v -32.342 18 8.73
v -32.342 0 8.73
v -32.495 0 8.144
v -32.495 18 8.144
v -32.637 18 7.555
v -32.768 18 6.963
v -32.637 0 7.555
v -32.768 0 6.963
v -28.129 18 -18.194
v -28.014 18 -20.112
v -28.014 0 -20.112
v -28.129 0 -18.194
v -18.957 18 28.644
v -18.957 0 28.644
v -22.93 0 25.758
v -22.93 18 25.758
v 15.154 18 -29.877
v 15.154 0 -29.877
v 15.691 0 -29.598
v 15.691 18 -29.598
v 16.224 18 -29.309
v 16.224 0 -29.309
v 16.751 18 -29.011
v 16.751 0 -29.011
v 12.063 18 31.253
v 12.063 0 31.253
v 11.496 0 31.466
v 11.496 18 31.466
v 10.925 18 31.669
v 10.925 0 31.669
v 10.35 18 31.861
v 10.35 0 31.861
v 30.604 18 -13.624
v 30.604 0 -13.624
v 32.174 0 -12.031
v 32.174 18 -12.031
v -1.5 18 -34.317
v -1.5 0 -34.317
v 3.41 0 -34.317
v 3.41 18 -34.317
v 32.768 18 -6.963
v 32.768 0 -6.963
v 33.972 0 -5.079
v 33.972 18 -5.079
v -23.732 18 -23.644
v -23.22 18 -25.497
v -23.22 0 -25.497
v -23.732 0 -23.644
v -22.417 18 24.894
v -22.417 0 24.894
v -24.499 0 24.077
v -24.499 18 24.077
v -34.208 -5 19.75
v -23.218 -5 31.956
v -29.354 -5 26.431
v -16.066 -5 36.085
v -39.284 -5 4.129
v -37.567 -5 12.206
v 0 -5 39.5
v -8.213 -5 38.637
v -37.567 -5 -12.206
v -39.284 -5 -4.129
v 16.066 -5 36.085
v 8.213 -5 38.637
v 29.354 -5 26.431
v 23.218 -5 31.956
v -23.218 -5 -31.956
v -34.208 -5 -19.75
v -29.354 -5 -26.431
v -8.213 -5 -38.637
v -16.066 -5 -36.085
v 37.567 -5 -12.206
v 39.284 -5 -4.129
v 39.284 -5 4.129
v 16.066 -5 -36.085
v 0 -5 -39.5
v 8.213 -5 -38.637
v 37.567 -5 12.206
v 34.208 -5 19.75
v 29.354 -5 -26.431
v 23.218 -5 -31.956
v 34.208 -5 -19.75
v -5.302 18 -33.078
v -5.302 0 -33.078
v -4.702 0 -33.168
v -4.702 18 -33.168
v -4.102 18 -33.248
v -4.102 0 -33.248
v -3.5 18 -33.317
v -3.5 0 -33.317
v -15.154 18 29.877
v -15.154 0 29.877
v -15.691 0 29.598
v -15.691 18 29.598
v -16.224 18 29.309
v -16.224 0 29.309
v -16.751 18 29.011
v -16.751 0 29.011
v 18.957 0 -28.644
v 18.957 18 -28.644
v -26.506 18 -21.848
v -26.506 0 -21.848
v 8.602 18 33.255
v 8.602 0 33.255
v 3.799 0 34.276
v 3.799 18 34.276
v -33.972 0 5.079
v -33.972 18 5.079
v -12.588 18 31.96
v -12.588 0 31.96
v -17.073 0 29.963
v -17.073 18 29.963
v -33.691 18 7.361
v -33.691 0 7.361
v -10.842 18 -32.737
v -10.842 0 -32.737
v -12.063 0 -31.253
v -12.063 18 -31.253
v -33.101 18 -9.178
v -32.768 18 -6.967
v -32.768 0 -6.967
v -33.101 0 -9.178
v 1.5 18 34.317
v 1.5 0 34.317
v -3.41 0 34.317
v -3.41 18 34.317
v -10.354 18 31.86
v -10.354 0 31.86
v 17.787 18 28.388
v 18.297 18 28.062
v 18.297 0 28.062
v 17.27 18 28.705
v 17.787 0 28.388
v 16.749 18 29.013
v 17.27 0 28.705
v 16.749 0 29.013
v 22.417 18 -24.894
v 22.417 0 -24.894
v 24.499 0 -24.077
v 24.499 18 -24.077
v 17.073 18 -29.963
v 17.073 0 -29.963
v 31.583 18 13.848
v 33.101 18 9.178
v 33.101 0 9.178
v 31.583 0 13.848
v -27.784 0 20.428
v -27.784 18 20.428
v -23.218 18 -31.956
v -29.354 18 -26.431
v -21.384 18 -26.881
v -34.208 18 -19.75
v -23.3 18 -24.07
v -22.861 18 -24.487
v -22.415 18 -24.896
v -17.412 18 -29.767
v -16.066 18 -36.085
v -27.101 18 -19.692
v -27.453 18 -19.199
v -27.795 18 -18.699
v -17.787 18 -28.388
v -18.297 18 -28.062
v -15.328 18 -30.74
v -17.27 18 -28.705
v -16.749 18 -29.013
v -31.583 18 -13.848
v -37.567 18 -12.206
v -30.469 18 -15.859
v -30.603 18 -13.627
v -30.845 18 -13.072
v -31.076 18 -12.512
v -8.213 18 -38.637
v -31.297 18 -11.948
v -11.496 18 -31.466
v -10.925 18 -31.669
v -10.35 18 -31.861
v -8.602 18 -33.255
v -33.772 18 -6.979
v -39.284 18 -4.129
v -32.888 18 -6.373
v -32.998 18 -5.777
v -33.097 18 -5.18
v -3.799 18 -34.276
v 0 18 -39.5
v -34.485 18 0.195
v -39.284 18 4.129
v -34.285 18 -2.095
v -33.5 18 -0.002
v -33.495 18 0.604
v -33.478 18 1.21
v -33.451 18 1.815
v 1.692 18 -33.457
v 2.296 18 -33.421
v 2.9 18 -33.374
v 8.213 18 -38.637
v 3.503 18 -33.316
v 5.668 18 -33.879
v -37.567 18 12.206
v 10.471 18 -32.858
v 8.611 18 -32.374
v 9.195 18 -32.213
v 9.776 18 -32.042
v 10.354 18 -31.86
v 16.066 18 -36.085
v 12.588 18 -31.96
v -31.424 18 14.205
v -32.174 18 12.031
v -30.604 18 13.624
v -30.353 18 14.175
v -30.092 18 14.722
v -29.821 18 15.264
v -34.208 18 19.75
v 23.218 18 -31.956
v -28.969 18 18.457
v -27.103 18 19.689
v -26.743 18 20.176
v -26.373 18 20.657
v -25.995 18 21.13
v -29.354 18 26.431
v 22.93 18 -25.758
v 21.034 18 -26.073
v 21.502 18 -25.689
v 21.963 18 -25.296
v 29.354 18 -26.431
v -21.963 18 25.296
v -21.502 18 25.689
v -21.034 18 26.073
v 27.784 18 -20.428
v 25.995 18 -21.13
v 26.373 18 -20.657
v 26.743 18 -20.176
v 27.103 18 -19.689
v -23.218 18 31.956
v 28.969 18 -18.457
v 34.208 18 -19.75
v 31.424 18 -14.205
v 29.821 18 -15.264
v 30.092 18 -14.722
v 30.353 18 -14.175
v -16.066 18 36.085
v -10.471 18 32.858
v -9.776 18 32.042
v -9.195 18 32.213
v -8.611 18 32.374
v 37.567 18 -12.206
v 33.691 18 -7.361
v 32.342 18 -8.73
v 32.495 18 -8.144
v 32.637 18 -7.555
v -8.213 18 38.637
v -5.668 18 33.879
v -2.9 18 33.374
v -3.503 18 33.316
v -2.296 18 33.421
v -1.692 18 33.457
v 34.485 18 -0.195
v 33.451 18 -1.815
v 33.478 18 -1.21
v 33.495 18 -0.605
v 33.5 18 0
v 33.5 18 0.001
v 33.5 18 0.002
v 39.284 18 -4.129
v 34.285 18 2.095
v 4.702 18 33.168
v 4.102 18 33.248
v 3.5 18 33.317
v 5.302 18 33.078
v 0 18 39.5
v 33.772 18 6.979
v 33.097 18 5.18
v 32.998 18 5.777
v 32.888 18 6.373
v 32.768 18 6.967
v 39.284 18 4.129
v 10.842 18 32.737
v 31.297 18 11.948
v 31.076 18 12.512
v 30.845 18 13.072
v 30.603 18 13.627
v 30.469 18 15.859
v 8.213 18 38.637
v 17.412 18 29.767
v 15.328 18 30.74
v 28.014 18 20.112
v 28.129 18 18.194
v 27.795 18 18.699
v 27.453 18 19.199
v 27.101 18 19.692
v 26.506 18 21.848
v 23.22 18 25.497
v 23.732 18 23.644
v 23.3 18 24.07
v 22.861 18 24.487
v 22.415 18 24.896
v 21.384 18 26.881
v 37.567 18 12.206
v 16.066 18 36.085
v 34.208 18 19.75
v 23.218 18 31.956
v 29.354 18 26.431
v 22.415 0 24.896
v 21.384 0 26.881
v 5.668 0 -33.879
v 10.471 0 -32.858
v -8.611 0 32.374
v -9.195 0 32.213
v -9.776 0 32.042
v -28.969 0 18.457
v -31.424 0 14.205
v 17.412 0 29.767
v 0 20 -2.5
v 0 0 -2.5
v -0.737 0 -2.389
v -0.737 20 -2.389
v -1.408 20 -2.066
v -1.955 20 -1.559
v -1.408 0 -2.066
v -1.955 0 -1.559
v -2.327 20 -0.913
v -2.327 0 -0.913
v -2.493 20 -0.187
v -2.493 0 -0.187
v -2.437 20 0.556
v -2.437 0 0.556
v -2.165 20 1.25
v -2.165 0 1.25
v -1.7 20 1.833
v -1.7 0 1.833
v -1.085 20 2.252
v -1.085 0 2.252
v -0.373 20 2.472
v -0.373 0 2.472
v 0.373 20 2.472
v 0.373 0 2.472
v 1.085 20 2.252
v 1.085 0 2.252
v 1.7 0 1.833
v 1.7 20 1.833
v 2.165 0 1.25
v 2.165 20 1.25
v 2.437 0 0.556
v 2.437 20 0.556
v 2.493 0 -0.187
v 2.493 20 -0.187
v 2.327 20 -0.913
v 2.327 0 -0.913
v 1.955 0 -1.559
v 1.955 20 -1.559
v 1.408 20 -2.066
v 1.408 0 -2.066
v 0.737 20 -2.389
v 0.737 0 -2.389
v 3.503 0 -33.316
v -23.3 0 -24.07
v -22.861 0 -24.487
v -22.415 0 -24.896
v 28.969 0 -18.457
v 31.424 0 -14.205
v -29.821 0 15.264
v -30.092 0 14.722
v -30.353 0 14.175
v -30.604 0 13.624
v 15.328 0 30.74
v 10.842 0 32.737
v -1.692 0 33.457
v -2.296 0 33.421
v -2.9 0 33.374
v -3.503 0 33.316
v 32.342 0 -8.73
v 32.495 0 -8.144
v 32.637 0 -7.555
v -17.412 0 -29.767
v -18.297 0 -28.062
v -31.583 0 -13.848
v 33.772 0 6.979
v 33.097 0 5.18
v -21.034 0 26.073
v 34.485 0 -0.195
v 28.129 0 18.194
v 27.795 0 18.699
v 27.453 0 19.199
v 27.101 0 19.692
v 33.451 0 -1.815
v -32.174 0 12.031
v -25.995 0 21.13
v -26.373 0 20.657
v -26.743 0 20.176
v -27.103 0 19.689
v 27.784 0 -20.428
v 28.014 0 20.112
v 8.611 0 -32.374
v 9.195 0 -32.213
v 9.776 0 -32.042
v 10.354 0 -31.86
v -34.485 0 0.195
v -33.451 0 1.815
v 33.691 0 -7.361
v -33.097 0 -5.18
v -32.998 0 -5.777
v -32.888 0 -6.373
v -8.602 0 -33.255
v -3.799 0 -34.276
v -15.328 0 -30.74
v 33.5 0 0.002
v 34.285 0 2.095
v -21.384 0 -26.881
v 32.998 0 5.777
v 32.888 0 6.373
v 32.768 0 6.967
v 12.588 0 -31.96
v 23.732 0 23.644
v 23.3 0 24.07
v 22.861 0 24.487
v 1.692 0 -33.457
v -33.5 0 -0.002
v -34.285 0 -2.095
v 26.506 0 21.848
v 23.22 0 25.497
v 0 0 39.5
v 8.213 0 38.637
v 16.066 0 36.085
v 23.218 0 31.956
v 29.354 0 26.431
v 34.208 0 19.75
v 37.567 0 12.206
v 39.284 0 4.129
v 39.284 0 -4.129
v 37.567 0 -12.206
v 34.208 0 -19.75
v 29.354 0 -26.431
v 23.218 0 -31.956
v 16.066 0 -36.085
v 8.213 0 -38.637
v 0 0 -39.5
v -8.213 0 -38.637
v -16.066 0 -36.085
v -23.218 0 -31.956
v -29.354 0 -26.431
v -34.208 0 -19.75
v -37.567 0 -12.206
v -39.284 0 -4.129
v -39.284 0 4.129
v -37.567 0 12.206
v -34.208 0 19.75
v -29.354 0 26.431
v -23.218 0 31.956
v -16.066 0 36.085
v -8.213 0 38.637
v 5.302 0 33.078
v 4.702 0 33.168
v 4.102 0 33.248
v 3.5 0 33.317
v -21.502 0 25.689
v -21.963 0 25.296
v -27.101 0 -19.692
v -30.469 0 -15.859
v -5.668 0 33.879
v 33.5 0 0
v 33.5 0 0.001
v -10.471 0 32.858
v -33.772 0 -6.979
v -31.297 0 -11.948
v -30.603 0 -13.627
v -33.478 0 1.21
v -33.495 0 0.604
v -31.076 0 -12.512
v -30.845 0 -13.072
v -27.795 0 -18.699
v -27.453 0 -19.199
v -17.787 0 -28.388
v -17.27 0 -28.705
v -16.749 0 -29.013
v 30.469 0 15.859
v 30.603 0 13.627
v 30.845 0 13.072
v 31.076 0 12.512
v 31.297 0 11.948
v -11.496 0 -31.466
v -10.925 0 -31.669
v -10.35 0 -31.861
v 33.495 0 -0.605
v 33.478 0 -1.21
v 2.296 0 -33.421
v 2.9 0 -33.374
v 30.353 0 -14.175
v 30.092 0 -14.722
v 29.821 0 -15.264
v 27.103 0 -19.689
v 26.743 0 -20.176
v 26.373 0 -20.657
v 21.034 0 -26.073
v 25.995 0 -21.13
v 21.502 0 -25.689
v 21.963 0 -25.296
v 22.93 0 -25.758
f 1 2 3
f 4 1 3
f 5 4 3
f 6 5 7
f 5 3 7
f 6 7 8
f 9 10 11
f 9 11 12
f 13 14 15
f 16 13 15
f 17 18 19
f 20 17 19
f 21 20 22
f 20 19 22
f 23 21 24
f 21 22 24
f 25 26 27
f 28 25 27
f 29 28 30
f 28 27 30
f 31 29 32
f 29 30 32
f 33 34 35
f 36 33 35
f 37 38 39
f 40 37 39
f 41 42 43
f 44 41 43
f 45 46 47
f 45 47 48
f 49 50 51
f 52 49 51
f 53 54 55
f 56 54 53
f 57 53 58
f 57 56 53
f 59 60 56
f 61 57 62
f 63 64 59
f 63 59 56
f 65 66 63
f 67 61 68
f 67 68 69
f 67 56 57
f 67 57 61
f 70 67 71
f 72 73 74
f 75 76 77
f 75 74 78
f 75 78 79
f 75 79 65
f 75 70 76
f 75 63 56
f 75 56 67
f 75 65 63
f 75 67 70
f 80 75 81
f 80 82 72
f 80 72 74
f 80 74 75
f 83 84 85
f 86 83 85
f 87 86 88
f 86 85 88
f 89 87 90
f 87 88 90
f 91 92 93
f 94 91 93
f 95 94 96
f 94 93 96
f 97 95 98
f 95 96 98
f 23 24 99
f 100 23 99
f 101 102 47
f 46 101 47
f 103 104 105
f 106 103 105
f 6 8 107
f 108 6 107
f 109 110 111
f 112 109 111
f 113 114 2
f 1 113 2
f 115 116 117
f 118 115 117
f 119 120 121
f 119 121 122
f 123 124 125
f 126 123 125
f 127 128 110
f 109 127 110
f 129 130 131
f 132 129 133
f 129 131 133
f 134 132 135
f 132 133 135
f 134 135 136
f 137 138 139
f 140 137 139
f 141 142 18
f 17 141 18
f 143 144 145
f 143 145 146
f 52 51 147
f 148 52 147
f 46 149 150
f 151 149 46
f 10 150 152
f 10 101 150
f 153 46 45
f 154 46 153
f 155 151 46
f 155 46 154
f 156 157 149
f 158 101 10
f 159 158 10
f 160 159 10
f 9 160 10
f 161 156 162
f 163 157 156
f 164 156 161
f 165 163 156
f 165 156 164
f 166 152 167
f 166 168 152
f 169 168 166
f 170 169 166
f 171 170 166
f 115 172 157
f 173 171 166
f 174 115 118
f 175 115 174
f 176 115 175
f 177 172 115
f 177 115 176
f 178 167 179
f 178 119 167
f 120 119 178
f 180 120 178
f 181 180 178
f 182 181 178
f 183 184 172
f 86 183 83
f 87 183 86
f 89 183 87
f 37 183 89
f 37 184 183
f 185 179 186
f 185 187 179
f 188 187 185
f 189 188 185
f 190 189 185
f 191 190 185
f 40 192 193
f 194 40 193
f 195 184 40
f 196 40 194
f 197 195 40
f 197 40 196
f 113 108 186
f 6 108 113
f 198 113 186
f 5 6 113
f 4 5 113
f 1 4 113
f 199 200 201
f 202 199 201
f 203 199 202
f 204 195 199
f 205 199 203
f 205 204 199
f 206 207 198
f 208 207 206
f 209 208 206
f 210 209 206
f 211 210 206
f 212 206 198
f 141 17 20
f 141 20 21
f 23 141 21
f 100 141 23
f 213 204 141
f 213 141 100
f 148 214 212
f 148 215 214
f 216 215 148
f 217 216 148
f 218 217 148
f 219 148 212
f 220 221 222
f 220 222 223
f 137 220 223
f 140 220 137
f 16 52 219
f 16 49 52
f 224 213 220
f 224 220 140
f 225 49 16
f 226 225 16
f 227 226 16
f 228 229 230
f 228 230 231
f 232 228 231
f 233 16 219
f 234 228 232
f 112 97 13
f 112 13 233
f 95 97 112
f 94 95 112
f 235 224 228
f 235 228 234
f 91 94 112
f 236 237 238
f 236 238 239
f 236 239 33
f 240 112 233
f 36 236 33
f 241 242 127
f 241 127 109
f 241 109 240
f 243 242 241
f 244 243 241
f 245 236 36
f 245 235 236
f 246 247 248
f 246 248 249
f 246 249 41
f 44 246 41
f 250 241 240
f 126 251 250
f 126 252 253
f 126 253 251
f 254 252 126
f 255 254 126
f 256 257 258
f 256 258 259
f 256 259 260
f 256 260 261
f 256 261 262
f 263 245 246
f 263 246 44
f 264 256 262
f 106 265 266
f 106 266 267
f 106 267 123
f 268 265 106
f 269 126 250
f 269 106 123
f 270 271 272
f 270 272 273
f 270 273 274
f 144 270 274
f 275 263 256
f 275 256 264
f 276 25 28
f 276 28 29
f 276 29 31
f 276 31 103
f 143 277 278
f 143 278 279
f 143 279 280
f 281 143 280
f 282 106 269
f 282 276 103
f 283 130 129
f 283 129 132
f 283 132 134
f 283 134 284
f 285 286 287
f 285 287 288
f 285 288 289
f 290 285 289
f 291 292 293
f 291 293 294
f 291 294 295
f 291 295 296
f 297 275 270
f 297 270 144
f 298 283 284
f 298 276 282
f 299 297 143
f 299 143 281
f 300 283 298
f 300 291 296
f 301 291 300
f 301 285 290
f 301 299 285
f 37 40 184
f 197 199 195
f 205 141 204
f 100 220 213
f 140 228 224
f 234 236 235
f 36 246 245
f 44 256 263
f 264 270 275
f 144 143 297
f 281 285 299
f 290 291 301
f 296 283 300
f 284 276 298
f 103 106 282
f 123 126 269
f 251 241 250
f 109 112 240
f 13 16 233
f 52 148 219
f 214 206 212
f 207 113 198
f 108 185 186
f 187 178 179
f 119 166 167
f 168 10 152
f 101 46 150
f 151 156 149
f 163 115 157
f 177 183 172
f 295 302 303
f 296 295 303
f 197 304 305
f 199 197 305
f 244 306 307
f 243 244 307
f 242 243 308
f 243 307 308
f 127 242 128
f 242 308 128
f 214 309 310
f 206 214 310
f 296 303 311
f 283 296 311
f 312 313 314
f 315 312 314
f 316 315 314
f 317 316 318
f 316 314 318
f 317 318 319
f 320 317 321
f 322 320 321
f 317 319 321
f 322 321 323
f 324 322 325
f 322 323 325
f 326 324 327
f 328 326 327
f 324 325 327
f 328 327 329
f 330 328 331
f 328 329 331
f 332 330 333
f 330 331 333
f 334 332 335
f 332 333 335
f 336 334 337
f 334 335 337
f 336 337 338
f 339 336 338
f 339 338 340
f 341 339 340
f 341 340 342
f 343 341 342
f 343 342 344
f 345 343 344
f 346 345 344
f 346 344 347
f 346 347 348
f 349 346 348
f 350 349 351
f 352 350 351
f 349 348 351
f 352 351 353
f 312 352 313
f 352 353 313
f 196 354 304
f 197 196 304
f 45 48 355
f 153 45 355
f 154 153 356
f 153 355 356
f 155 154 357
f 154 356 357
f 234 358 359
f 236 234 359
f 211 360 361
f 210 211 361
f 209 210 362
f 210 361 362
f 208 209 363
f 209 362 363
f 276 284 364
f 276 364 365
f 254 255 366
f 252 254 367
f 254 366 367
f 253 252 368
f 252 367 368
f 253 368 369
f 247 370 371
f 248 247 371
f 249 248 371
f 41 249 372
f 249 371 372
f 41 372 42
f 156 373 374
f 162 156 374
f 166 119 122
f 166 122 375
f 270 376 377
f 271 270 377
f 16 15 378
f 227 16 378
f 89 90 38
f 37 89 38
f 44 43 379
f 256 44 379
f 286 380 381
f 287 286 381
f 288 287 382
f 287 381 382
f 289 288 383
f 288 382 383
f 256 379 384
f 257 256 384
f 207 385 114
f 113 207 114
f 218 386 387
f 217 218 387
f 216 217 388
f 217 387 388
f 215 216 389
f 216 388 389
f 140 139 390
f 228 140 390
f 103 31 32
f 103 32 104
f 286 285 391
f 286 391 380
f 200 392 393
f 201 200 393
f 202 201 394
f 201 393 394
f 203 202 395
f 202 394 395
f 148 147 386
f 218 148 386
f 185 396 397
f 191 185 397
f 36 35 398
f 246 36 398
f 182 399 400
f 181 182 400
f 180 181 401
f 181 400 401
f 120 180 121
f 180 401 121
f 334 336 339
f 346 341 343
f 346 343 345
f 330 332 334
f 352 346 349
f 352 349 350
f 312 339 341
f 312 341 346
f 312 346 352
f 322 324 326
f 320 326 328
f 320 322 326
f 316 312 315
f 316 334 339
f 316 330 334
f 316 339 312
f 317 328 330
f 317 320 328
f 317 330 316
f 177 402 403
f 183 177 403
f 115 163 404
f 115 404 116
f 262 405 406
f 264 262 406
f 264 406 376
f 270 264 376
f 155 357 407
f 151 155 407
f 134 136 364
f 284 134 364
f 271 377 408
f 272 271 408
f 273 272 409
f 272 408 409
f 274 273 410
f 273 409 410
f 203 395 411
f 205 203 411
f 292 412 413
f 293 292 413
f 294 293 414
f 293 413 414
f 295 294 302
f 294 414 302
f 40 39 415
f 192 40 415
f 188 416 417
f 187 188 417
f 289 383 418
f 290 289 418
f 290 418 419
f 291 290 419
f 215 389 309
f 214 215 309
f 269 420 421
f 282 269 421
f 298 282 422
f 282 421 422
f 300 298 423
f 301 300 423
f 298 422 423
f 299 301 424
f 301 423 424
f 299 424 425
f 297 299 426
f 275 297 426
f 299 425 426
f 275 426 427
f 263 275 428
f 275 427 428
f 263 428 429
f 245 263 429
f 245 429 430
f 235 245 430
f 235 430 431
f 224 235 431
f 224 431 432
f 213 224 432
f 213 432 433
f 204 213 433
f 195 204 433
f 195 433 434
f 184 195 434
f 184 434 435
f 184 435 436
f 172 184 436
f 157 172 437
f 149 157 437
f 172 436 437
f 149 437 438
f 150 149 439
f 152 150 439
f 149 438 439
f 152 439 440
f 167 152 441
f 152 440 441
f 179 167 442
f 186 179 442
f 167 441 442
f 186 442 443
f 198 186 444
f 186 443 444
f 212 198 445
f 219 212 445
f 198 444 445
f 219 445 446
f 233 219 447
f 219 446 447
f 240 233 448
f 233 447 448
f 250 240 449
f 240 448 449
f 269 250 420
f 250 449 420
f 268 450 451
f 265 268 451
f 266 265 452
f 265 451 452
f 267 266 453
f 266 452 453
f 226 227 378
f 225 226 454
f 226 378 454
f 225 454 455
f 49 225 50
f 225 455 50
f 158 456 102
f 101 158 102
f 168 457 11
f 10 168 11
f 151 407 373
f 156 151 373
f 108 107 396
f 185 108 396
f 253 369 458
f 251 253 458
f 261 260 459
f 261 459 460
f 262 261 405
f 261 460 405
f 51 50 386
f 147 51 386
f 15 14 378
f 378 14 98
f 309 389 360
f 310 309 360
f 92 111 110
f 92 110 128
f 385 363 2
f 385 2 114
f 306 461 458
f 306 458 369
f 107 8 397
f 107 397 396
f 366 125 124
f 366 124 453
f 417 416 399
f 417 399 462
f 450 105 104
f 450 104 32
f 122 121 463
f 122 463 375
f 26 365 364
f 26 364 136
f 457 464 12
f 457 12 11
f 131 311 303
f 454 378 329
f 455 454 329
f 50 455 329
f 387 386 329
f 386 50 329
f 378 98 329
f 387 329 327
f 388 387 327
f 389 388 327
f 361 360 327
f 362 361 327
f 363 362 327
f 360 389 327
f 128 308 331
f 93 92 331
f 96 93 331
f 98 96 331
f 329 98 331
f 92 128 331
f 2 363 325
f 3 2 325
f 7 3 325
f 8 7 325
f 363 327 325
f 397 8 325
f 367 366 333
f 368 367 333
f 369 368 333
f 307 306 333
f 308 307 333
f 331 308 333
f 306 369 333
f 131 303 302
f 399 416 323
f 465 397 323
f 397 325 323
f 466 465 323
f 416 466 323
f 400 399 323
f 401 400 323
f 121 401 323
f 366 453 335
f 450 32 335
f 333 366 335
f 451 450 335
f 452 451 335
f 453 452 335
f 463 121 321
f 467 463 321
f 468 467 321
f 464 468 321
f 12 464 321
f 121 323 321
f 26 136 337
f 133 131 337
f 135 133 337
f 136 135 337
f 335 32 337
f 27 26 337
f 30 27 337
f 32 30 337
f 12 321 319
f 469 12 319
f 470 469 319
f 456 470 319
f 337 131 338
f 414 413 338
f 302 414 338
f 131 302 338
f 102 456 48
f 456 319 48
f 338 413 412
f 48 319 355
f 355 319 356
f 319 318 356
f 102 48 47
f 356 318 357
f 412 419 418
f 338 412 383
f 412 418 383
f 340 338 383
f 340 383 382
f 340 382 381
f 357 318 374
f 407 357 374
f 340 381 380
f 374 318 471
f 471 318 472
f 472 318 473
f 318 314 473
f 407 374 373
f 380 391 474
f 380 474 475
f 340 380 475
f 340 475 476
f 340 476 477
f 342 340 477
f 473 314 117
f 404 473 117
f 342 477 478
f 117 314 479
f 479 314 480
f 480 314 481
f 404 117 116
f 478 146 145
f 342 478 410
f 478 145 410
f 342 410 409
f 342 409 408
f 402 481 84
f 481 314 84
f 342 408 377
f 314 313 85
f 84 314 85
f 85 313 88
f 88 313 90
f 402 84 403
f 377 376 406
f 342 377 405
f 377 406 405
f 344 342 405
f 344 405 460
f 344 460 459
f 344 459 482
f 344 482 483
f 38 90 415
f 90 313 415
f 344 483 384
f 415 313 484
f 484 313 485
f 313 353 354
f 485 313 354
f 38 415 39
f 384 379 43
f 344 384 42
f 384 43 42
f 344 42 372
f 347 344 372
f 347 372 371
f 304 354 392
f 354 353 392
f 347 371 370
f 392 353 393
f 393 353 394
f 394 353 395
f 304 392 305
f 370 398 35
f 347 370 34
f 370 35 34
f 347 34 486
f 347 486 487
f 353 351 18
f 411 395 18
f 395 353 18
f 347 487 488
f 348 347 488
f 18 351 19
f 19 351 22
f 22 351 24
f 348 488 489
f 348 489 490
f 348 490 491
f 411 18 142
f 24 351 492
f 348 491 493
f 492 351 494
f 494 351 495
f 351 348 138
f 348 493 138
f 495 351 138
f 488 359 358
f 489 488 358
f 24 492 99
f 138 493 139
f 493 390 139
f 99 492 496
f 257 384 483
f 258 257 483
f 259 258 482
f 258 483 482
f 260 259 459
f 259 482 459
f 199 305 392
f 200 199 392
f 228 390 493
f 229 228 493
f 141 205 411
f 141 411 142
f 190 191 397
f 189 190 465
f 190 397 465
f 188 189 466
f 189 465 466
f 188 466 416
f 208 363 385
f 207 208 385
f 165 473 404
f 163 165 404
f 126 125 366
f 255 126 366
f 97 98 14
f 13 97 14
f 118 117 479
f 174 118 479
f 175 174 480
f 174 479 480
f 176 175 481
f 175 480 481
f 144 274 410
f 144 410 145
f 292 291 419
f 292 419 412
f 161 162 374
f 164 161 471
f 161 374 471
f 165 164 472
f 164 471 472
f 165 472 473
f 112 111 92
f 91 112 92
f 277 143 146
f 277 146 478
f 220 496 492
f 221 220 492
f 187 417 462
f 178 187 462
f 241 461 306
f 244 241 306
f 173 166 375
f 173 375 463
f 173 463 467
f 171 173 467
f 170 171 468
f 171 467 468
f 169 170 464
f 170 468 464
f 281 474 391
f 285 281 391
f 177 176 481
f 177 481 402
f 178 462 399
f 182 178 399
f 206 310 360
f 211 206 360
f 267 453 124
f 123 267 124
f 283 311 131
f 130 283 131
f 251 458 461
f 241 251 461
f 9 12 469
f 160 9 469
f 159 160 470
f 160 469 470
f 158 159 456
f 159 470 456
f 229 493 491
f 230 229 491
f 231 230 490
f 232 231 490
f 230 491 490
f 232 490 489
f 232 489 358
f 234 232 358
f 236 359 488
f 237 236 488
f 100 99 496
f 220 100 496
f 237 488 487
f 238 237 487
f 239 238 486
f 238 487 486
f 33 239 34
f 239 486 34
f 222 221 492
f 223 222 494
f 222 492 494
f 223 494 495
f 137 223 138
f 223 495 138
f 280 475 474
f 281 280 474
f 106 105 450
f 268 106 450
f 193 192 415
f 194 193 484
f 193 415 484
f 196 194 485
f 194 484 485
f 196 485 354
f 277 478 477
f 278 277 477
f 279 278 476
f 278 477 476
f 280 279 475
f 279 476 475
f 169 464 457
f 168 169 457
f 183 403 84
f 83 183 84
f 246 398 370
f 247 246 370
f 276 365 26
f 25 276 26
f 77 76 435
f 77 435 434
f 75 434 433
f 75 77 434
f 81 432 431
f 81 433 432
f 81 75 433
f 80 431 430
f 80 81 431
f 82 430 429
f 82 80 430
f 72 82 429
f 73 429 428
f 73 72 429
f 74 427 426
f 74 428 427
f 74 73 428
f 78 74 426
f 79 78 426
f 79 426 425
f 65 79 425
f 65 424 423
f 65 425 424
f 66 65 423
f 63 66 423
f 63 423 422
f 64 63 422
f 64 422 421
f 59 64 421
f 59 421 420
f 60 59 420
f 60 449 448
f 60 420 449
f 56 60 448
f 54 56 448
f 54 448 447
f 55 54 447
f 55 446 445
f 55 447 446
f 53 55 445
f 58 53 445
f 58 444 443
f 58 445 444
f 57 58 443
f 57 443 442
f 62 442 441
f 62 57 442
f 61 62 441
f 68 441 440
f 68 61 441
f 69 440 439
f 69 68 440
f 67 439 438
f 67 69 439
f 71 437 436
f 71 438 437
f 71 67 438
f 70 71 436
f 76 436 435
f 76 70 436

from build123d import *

# Parameters (mm, degrees)
SKETCH1_R           = 39.5
BOSS_EXTRUDE1_DEPTH = 18
BOSS_EXTRUDE2_START = 5
SKETCH2_R           = 39.5
BOSS_EXTRUDE2_DEPTH = 5
SKETCH3_R           = 2.5
BOSS_EXTRUDE3_DEPTH = 20


with BuildPart() as part:
    # Sketch1 → Boss-Extrude1 (new body)
    with BuildSketch(Plane(origin=(0, 0, 0), x_dir=(1, 0, 0), z_dir=(0, 1, 0))):
        with Locations(Location((0, 0, 0), (0, 0, 270))):
            Circle(SKETCH1_R)
        with BuildLine():
            ThreePointArc((-5.301518913, 33.077846018), (-4.402379143, 33.209472412), (-3.5, 33.316662498))
            Line((-3.5, 33.316662498), (-1.5, 34.316662498))
            Line((-1.5, 34.316662498), (3.410400922, 34.316662498))
            Line((3.410400922, 34.316662498), (1.691602889, 33.457263481))
            ThreePointArc((1.691602889, 33.457263481), (2.598460964, 33.399071853), (3.50340703, 33.316304405))
            Line((3.50340703, 33.316304405), (5.667613922, 33.878628624))
            Line((5.667613922, 33.878628624), (10.470710803, 32.857698865))
            Line((10.470710803, 32.857698865), (8.610793528, 32.374437985))
            ThreePointArc((8.610793528, 32.374437985), (9.485735858, 32.128971587), (10.353698361, 31.85986394))
            Line((10.353698361, 31.85986394), (12.58752592, 31.959936111))
            Line((12.58752592, 31.959936111), (17.073400377, 29.962696124))
            Line((17.073400377, 29.962696124), (15.153651171, 29.876694198))
            ThreePointArc((15.153651171, 29.876694198), (15.958438578, 29.454681091), (16.751483392, 29.01099454))
            Line((16.751483392, 29.01099454), (18.957302633, 28.644441029))
            Line((18.957302633, 28.644441029), (22.929900428, 25.758179785))
            Line((22.929900428, 25.758179785), (21.034221542, 26.073195511))
            ThreePointArc((21.034221542, 26.073195511), (21.733680954, 25.493079692), (22.417148215, 24.894205468))
            Line((22.417148215, 24.894205468), (24.498554253, 24.077046424))
            Line((24.498554253, 24.077046424), (27.7842538, 20.427907387))
            Line((27.7842538, 20.427907387), (25.995495498, 21.130173066))
            ThreePointArc((25.995495498, 21.130173066), (26.559057183, 20.417308381), (27.103076093, 19.689420162))
            Line((27.103076093, 19.689420162), (28.969101496, 18.457369355))
            Line((28.969101496, 18.457369355), (31.424301957, 14.204837413))
            Line((31.424301957, 14.204837413), (29.820641561, 15.263660665))
            ThreePointArc((29.820641561, 15.263660665), (30.223675169, 14.449202721), (30.60446949, 13.624112715))
            Line((30.60446949, 13.624112715), (32.173559995, 12.031016677))
            Line((32.173559995, 12.031016677), (33.690957329, 7.360947882))
            Line((33.690957329, 7.360947882), (32.342482492, 8.73005305))
            ThreePointArc((32.342482492, 8.73005305), (32.567373521, 7.849597567), (32.768300713, 6.963366166))
            Line((32.768300713, 6.963366166), (33.971879535, 5.078850838))
            Line((33.971879535, 5.078850838), (34.485156198, 0.195349606))
            Line((34.485156198, 0.195349606), (33.450801742, 1.814900225))
            ThreePointArc((33.450801742, 1.814900225), (33.487698177, 0.907783468), (33.5, 0))
            ThreePointArc((33.5, 0), (33.499999989, -0.000856449), (33.499999956, -0.001712898))
            Line((33.499999956, -0.001712898), (34.285464925, -2.095285152))
            Line((34.285464925, -2.095285152), (33.772188263, -6.978786385))
            Line((33.772188263, -6.978786385), (33.097160441, -5.179572449))
            ThreePointArc((33.097160441, -5.179572449), (32.944495111, -6.075379978), (32.76758845, -6.966717101))
            Line((32.76758845, -6.966717101), (33.100610978, -9.177847128))
            Line((33.100610978, -9.177847128), (31.583213644, -13.847915922))
            Line((31.583213644, -13.847915922), (31.297014411, -11.947672952))
            ThreePointArc((31.297014411, -11.947672952), (30.961436327, -12.792164031), (30.603076093, -13.627242336))
            Line((30.603076093, -13.627242336), (30.469101496, -15.859293143))
            Line((30.469101496, -15.859293143), (28.013901035, -20.111825085))
            Line((28.013901035, -20.111825085), (28.129038671, -18.193602816))
            ThreePointArc((28.129038671, -18.193602816), (27.625214205, -18.949869132), (27.10106246, -19.69219169))
            Line((27.10106246, -19.69219169), (26.505946073, -21.847611947))
            Line((26.505946073, -21.847611947), (23.220246526, -25.496750984))
            Line((23.220246526, -25.496750984), (23.731688964, -23.644384934))
            ThreePointArc((23.731688964, -23.644384934), (23.081637663, -24.27937402), (22.414602352, -24.896497774))
            Line((22.414602352, -24.896497774), (21.384353616, -26.881085273))
            Line((21.384353616, -26.881085273), (17.41175582, -29.767346518))
            Line((17.41175582, -29.767346518), (18.297150571, -28.061793973))
            ThreePointArc((18.297150571, -28.061793973), (17.529282796, -28.547753758), (16.748516565, -29.012707438))
            Line((16.748516565, -29.012707438), (15.328162292, -30.739726182))
            Line((15.328162292, -30.739726182), (10.842287835, -32.736966169))
            Line((10.842287835, -32.736966169), (12.062938899, -31.252767959))
            ThreePointArc((12.062938899, -31.252767959), (11.210814157, -31.56845967), (10.350440235, -31.860922569))
            Line((10.350440235, -31.860922569), (8.602056724, -33.254893551))
            Line((8.602056724, -33.254893551), (3.798959843, -34.27582331))
            Line((3.798959843, -34.27582331), (5.301518913, -33.077846018))
            ThreePointArc((5.301518913, -33.077846018), (4.402379143, -33.209472412), (3.5, -33.316662498))
            Line((3.5, -33.316662498), (1.5, -34.316662498))
            Line((1.5, -34.316662498), (-3.410400922, -34.316662498))
            Line((-3.410400922, -34.316662498), (-1.691602889, -33.457263481))
            ThreePointArc((-1.691602889, -33.457263481), (-2.598460964, -33.399071853), (-3.50340703, -33.316304405))
            Line((-3.50340703, -33.316304405), (-5.667613922, -33.878628624))
            Line((-5.667613922, -33.878628624), (-10.470710803, -32.857698865))
            Line((-10.470710803, -32.857698865), (-8.610793528, -32.374437985))
            ThreePointArc((-8.610793528, -32.374437985), (-9.485735858, -32.128971587), (-10.353698361, -31.85986394))
            Line((-10.353698361, -31.85986394), (-12.587525919, -31.959936111))
            Line((-12.587525919, -31.959936111), (-17.073400377, -29.962696124))
            Line((-17.073400377, -29.962696124), (-15.153651171, -29.876694198))
            ThreePointArc((-15.153651171, -29.876694198), (-15.958438577, -29.454681091), (-16.751483392, -29.01099454))
            Line((-16.751483392, -29.01099454), (-18.957302633, -28.644441029))
            Line((-18.957302633, -28.644441029), (-22.929900428, -25.758179785))
            Line((-22.929900428, -25.758179785), (-21.034221542, -26.073195511))
            ThreePointArc((-21.034221542, -26.073195511), (-21.733680954, -25.493079692), (-22.417148215, -24.894205468))
            Line((-22.417148215, -24.894205468), (-24.498554253, -24.077046424))
            Line((-24.498554253, -24.077046424), (-27.7842538, -20.427907387))
            Line((-27.7842538, -20.427907387), (-25.995495498, -21.130173066))
            ThreePointArc((-25.995495498, -21.130173066), (-26.559057183, -20.417308381), (-27.103076092, -19.689420162))
            Line((-27.103076092, -19.689420162), (-28.969101496, -18.457369355))
            Line((-28.969101496, -18.457369355), (-31.424301957, -14.204837413))
            Line((-31.424301957, -14.204837413), (-29.820641561, -15.263660665))
            ThreePointArc((-29.820641561, -15.263660665), (-30.223675169, -14.449202721), (-30.60446949, -13.624112715))
            Line((-30.60446949, -13.624112715), (-32.173559995, -12.031016677))
            Line((-32.173559995, -12.031016677), (-33.690957329, -7.360947882))
            Line((-33.690957329, -7.360947882), (-32.342482492, -8.73005305))
            ThreePointArc((-32.342482492, -8.73005305), (-32.567373521, -7.849597567), (-32.768300713, -6.963366166))
            Line((-32.768300713, -6.963366166), (-33.971879535, -5.078850838))
            Line((-33.971879535, -5.078850838), (-34.485156198, -0.195349606))
            Line((-34.485156198, -0.195349606), (-33.450801742, -1.814900225))
            ThreePointArc((-33.450801742, -1.814900225), (-33.487721374, -0.906927333), (-33.499999956, 0.001712898))
            Line((-33.499999956, 0.001712898), (-34.285464925, 2.095285152))
            Line((-34.285464925, 2.095285152), (-33.772188263, 6.978786385))
            Line((-33.772188263, 6.978786385), (-33.097160441, 5.179572449))
            ThreePointArc((-33.097160441, 5.179572449), (-32.944495111, 6.075379978), (-32.76758845, 6.966717101))
            Line((-32.76758845, 6.966717101), (-33.100610978, 9.177847128))
            Line((-33.100610978, 9.177847128), (-31.583213644, 13.847915922))
            Line((-31.583213644, 13.847915922), (-31.297014411, 11.947672952))
            ThreePointArc((-31.297014411, 11.947672952), (-30.961436327, 12.792164031), (-30.603076093, 13.627242336))
            Line((-30.603076092, 13.627242336), (-30.469101496, 15.859293143))
            Line((-30.469101496, 15.859293143), (-28.013901035, 20.111825085))
            Line((-28.013901035, 20.111825085), (-28.129038671, 18.193602816))
            ThreePointArc((-28.129038671, 18.193602816), (-27.625214205, 18.949869132), (-27.10106246, 19.69219169))
            Line((-27.10106246, 19.69219169), (-26.505946073, 21.847611947))
            Line((-26.505946073, 21.847611947), (-23.220246526, 25.496750984))
            Line((-23.220246526, 25.496750984), (-23.731688964, 23.644384934))
            ThreePointArc((-23.731688964, 23.644384934), (-23.081637663, 24.27937402), (-22.414602352, 24.896497774))
            Line((-22.414602352, 24.896497774), (-21.384353616, 26.881085273))
            Line((-21.384353616, 26.881085273), (-17.41175582, 29.767346518))
            Line((-17.41175582, 29.767346518), (-18.297150571, 28.061793973))
            ThreePointArc((-18.297150571, 28.061793973), (-17.529282796, 28.547753758), (-16.748516565, 29.012707438))
            Line((-16.748516565, 29.012707438), (-15.328162292, 30.739726182))
            Line((-15.328162292, 30.739726182), (-10.842287835, 32.736966169))
            Line((-10.842287835, 32.736966169), (-12.062938899, 31.252767959))
            ThreePointArc((-12.062938899, 31.252767959), (-11.210814157, 31.56845967), (-10.350440235, 31.860922569))
            Line((-10.350440235, 31.860922569), (-8.602056724, 33.254893551))
            Line((-8.602056724, 33.254893551), (-3.798959843, 34.27582331))
            Line((-3.798959843, 34.27582331), (-5.301518913, 33.077846018))
        make_face(mode=Mode.SUBTRACT)
    extrude(amount=BOSS_EXTRUDE1_DEPTH)

    # Sketch2 → Boss-Extrude2 (add)
    with BuildSketch(Plane(origin=(0, 0, 0), x_dir=(-1, 0, 0), z_dir=(0, -1, 0)).offset(BOSS_EXTRUDE2_START)):
        with Locations(Location((0, 0, 0), (0, 0, 90))):
            Circle(SKETCH2_R)
    extrude(amount=-BOSS_EXTRUDE2_DEPTH)

    # Sketch3 → Boss-Extrude3 (add)
    with BuildSketch(Plane(origin=(0, 0, 0), x_dir=(1, 0, 0), z_dir=(0, 1, 0))):
        with Locations(Location((0, 0, 0), (0, 0, 90))):
            Circle(SKETCH3_R)
    extrude(amount=BOSS_EXTRUDE3_DEPTH)


solid = part.part
